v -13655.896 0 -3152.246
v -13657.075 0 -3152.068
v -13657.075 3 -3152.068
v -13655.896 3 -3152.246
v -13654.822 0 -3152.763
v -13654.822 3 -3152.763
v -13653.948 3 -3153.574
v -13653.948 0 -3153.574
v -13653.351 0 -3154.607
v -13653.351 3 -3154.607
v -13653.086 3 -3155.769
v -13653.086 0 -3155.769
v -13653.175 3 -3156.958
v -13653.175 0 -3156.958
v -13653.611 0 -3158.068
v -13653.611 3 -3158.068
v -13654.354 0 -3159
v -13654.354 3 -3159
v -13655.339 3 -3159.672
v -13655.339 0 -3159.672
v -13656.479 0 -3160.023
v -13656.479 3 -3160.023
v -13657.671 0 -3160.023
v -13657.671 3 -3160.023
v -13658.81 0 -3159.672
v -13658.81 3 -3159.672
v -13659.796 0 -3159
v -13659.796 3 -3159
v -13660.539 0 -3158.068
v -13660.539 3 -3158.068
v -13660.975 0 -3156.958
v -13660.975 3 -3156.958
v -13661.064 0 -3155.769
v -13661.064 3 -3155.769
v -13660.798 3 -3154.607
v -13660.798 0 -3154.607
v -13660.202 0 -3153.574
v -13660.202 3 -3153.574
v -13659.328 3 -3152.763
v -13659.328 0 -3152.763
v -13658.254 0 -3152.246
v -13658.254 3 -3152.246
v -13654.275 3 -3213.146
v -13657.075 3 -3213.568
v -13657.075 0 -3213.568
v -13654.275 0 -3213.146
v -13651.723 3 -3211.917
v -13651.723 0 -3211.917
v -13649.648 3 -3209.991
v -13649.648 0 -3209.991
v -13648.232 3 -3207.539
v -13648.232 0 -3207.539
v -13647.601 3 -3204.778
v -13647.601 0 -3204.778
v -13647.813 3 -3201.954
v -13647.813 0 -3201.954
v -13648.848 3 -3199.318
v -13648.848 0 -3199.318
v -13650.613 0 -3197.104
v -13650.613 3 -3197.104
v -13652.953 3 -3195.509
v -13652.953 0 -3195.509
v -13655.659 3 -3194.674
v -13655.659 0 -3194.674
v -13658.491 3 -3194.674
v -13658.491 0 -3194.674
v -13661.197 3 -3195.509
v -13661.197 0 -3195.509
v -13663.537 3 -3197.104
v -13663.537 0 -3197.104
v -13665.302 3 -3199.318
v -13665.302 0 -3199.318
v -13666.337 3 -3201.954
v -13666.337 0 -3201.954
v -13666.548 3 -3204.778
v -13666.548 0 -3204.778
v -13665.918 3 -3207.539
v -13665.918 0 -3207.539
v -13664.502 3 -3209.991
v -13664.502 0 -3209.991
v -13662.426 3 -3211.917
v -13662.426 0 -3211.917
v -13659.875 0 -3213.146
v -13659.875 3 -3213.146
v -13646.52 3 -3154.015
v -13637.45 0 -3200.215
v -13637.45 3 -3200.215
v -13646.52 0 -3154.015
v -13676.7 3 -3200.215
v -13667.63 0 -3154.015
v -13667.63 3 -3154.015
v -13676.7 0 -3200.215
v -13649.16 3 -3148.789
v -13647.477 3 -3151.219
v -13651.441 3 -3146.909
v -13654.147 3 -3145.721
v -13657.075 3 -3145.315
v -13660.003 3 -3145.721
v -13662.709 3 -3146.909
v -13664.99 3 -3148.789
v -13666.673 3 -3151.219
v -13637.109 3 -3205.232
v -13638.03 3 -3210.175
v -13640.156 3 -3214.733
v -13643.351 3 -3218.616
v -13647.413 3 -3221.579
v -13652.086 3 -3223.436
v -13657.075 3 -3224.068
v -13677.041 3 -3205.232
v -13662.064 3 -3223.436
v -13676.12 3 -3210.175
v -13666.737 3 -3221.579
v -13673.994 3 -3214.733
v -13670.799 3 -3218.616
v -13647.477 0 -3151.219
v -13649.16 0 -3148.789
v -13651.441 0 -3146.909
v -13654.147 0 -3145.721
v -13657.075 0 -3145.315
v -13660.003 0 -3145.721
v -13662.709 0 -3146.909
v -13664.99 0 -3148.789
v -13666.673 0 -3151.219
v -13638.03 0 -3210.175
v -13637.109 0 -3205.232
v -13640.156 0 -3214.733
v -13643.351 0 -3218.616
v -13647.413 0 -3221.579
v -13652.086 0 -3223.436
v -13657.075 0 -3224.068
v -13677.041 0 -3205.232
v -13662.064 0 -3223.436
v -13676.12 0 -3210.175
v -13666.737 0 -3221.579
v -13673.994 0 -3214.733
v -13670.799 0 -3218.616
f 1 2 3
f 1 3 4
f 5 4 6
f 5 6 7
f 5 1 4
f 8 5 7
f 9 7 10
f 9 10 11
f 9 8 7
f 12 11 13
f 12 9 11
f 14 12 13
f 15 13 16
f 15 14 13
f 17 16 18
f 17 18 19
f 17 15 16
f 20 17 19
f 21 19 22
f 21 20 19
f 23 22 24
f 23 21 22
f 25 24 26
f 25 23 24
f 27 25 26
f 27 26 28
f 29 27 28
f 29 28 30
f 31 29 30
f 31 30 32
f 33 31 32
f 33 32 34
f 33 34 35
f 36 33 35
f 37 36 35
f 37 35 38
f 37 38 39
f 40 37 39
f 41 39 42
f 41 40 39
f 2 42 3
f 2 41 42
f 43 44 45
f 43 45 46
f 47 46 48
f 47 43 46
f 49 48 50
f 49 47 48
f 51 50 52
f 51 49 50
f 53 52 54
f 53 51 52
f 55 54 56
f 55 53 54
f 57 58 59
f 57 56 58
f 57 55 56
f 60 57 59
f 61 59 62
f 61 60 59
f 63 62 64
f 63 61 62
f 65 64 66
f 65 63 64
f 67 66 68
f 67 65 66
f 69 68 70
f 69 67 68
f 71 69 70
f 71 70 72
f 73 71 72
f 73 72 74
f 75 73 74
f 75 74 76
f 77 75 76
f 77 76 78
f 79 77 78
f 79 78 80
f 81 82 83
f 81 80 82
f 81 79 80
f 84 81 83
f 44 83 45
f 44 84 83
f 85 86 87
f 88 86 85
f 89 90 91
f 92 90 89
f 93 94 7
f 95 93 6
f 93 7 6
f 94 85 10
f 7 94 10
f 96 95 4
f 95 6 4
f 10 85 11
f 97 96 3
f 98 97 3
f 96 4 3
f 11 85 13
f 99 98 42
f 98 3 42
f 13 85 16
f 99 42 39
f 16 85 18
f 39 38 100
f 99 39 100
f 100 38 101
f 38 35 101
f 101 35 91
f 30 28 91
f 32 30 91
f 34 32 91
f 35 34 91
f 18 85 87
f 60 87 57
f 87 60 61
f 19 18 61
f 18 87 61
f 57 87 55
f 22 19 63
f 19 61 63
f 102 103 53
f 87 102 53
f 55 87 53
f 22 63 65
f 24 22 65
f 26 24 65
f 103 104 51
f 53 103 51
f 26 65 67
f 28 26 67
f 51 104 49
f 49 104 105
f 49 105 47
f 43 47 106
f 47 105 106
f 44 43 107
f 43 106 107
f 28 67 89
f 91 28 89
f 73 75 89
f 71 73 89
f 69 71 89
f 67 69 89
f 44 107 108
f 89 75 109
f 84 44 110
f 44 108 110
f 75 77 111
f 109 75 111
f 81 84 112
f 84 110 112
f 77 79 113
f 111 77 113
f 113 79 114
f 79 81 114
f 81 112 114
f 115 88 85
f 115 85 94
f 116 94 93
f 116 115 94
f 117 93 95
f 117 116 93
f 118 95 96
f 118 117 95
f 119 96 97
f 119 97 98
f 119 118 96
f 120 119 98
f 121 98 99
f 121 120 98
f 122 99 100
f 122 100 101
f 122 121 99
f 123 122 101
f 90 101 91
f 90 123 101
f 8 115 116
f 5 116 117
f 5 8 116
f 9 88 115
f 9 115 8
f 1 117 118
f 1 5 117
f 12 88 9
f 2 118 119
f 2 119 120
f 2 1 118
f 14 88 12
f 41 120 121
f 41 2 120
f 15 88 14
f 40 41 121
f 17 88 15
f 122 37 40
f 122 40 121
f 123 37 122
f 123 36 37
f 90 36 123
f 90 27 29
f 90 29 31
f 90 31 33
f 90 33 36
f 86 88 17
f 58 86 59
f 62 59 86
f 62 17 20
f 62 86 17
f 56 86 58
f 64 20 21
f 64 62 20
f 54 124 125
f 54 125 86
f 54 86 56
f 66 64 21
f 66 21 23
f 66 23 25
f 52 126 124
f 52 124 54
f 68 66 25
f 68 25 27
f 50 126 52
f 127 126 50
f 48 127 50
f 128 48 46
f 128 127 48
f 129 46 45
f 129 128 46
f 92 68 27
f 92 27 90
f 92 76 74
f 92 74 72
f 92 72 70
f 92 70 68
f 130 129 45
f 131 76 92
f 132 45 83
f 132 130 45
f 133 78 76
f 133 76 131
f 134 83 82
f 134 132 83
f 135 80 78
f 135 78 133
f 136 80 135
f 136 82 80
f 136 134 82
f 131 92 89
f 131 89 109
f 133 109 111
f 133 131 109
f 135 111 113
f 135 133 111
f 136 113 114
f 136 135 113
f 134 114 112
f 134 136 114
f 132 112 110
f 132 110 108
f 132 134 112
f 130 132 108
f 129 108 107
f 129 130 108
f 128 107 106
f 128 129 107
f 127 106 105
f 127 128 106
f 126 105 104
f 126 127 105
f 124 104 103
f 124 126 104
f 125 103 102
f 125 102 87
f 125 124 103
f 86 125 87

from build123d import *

# Parameters (mm, degrees)
SKETCH1_R               = 3.999999916
BOSS_EXTRUDE1_DEPTH     = 3
CUT_EXTRUDE3_DEPTH      = 14052.939444196
CUT_EXTRUDE3_DEPTH_BACK = 14052.939444196
SKETCH3_R               = 9.5


with BuildPart() as part:
    # Sketch1 → Boss-Extrude1 (new body)
    with BuildSketch(Plane(origin=(0, 0, 0), x_dir=(1, 0, 0), z_dir=(0, 1, 0))):
        with BuildLine():
            Line((-13667.630300179, 3154.015259161), (-13676.700320557, 3200.215044723))
            ThreePointArc((-13676.700320557, 3200.215044723), (-13657.074947978, 3224.067930782), (-13637.449575399, 3200.215044723))
            Line((-13637.449575399, 3200.215044723), (-13646.519595777, 3154.015259161))
            ThreePointArc((-13646.519595777, 3154.015259161), (-13657.074947978, 3145.314842225), (-13667.630300179, 3154.015259161))
        make_face()
        with Locations(Location((-13657.074947978, 3156.067931204, 0), (0, 0, 269.999999999))):
            Circle(SKETCH1_R, mode=Mode.SUBTRACT)
        Polygon((-13663.074951578, 3198.067969394), (-13651.074950322, 3198.067909928), (-13651.074919654, 3210.067922748), (-13663.074916837, 3210.067922748), align=None, mode=Mode.SUBTRACT)
    extrude(amount=BOSS_EXTRUDE1_DEPTH)

    # Sketch3 → Cut-Extrude3 (cut, two sides: drawn at the far end of the back side and taken through both)
    with BuildSketch(Plane.XZ.offset(-CUT_EXTRUDE3_DEPTH_BACK)):
        with Locations(Location((-13657.07493358, -3204.067916338, 0), (0, 0, 270))):
            Circle(SKETCH3_R)
    extrude(amount=CUT_EXTRUDE3_DEPTH + CUT_EXTRUDE3_DEPTH_BACK, mode=Mode.SUBTRACT)


solid = part.part
